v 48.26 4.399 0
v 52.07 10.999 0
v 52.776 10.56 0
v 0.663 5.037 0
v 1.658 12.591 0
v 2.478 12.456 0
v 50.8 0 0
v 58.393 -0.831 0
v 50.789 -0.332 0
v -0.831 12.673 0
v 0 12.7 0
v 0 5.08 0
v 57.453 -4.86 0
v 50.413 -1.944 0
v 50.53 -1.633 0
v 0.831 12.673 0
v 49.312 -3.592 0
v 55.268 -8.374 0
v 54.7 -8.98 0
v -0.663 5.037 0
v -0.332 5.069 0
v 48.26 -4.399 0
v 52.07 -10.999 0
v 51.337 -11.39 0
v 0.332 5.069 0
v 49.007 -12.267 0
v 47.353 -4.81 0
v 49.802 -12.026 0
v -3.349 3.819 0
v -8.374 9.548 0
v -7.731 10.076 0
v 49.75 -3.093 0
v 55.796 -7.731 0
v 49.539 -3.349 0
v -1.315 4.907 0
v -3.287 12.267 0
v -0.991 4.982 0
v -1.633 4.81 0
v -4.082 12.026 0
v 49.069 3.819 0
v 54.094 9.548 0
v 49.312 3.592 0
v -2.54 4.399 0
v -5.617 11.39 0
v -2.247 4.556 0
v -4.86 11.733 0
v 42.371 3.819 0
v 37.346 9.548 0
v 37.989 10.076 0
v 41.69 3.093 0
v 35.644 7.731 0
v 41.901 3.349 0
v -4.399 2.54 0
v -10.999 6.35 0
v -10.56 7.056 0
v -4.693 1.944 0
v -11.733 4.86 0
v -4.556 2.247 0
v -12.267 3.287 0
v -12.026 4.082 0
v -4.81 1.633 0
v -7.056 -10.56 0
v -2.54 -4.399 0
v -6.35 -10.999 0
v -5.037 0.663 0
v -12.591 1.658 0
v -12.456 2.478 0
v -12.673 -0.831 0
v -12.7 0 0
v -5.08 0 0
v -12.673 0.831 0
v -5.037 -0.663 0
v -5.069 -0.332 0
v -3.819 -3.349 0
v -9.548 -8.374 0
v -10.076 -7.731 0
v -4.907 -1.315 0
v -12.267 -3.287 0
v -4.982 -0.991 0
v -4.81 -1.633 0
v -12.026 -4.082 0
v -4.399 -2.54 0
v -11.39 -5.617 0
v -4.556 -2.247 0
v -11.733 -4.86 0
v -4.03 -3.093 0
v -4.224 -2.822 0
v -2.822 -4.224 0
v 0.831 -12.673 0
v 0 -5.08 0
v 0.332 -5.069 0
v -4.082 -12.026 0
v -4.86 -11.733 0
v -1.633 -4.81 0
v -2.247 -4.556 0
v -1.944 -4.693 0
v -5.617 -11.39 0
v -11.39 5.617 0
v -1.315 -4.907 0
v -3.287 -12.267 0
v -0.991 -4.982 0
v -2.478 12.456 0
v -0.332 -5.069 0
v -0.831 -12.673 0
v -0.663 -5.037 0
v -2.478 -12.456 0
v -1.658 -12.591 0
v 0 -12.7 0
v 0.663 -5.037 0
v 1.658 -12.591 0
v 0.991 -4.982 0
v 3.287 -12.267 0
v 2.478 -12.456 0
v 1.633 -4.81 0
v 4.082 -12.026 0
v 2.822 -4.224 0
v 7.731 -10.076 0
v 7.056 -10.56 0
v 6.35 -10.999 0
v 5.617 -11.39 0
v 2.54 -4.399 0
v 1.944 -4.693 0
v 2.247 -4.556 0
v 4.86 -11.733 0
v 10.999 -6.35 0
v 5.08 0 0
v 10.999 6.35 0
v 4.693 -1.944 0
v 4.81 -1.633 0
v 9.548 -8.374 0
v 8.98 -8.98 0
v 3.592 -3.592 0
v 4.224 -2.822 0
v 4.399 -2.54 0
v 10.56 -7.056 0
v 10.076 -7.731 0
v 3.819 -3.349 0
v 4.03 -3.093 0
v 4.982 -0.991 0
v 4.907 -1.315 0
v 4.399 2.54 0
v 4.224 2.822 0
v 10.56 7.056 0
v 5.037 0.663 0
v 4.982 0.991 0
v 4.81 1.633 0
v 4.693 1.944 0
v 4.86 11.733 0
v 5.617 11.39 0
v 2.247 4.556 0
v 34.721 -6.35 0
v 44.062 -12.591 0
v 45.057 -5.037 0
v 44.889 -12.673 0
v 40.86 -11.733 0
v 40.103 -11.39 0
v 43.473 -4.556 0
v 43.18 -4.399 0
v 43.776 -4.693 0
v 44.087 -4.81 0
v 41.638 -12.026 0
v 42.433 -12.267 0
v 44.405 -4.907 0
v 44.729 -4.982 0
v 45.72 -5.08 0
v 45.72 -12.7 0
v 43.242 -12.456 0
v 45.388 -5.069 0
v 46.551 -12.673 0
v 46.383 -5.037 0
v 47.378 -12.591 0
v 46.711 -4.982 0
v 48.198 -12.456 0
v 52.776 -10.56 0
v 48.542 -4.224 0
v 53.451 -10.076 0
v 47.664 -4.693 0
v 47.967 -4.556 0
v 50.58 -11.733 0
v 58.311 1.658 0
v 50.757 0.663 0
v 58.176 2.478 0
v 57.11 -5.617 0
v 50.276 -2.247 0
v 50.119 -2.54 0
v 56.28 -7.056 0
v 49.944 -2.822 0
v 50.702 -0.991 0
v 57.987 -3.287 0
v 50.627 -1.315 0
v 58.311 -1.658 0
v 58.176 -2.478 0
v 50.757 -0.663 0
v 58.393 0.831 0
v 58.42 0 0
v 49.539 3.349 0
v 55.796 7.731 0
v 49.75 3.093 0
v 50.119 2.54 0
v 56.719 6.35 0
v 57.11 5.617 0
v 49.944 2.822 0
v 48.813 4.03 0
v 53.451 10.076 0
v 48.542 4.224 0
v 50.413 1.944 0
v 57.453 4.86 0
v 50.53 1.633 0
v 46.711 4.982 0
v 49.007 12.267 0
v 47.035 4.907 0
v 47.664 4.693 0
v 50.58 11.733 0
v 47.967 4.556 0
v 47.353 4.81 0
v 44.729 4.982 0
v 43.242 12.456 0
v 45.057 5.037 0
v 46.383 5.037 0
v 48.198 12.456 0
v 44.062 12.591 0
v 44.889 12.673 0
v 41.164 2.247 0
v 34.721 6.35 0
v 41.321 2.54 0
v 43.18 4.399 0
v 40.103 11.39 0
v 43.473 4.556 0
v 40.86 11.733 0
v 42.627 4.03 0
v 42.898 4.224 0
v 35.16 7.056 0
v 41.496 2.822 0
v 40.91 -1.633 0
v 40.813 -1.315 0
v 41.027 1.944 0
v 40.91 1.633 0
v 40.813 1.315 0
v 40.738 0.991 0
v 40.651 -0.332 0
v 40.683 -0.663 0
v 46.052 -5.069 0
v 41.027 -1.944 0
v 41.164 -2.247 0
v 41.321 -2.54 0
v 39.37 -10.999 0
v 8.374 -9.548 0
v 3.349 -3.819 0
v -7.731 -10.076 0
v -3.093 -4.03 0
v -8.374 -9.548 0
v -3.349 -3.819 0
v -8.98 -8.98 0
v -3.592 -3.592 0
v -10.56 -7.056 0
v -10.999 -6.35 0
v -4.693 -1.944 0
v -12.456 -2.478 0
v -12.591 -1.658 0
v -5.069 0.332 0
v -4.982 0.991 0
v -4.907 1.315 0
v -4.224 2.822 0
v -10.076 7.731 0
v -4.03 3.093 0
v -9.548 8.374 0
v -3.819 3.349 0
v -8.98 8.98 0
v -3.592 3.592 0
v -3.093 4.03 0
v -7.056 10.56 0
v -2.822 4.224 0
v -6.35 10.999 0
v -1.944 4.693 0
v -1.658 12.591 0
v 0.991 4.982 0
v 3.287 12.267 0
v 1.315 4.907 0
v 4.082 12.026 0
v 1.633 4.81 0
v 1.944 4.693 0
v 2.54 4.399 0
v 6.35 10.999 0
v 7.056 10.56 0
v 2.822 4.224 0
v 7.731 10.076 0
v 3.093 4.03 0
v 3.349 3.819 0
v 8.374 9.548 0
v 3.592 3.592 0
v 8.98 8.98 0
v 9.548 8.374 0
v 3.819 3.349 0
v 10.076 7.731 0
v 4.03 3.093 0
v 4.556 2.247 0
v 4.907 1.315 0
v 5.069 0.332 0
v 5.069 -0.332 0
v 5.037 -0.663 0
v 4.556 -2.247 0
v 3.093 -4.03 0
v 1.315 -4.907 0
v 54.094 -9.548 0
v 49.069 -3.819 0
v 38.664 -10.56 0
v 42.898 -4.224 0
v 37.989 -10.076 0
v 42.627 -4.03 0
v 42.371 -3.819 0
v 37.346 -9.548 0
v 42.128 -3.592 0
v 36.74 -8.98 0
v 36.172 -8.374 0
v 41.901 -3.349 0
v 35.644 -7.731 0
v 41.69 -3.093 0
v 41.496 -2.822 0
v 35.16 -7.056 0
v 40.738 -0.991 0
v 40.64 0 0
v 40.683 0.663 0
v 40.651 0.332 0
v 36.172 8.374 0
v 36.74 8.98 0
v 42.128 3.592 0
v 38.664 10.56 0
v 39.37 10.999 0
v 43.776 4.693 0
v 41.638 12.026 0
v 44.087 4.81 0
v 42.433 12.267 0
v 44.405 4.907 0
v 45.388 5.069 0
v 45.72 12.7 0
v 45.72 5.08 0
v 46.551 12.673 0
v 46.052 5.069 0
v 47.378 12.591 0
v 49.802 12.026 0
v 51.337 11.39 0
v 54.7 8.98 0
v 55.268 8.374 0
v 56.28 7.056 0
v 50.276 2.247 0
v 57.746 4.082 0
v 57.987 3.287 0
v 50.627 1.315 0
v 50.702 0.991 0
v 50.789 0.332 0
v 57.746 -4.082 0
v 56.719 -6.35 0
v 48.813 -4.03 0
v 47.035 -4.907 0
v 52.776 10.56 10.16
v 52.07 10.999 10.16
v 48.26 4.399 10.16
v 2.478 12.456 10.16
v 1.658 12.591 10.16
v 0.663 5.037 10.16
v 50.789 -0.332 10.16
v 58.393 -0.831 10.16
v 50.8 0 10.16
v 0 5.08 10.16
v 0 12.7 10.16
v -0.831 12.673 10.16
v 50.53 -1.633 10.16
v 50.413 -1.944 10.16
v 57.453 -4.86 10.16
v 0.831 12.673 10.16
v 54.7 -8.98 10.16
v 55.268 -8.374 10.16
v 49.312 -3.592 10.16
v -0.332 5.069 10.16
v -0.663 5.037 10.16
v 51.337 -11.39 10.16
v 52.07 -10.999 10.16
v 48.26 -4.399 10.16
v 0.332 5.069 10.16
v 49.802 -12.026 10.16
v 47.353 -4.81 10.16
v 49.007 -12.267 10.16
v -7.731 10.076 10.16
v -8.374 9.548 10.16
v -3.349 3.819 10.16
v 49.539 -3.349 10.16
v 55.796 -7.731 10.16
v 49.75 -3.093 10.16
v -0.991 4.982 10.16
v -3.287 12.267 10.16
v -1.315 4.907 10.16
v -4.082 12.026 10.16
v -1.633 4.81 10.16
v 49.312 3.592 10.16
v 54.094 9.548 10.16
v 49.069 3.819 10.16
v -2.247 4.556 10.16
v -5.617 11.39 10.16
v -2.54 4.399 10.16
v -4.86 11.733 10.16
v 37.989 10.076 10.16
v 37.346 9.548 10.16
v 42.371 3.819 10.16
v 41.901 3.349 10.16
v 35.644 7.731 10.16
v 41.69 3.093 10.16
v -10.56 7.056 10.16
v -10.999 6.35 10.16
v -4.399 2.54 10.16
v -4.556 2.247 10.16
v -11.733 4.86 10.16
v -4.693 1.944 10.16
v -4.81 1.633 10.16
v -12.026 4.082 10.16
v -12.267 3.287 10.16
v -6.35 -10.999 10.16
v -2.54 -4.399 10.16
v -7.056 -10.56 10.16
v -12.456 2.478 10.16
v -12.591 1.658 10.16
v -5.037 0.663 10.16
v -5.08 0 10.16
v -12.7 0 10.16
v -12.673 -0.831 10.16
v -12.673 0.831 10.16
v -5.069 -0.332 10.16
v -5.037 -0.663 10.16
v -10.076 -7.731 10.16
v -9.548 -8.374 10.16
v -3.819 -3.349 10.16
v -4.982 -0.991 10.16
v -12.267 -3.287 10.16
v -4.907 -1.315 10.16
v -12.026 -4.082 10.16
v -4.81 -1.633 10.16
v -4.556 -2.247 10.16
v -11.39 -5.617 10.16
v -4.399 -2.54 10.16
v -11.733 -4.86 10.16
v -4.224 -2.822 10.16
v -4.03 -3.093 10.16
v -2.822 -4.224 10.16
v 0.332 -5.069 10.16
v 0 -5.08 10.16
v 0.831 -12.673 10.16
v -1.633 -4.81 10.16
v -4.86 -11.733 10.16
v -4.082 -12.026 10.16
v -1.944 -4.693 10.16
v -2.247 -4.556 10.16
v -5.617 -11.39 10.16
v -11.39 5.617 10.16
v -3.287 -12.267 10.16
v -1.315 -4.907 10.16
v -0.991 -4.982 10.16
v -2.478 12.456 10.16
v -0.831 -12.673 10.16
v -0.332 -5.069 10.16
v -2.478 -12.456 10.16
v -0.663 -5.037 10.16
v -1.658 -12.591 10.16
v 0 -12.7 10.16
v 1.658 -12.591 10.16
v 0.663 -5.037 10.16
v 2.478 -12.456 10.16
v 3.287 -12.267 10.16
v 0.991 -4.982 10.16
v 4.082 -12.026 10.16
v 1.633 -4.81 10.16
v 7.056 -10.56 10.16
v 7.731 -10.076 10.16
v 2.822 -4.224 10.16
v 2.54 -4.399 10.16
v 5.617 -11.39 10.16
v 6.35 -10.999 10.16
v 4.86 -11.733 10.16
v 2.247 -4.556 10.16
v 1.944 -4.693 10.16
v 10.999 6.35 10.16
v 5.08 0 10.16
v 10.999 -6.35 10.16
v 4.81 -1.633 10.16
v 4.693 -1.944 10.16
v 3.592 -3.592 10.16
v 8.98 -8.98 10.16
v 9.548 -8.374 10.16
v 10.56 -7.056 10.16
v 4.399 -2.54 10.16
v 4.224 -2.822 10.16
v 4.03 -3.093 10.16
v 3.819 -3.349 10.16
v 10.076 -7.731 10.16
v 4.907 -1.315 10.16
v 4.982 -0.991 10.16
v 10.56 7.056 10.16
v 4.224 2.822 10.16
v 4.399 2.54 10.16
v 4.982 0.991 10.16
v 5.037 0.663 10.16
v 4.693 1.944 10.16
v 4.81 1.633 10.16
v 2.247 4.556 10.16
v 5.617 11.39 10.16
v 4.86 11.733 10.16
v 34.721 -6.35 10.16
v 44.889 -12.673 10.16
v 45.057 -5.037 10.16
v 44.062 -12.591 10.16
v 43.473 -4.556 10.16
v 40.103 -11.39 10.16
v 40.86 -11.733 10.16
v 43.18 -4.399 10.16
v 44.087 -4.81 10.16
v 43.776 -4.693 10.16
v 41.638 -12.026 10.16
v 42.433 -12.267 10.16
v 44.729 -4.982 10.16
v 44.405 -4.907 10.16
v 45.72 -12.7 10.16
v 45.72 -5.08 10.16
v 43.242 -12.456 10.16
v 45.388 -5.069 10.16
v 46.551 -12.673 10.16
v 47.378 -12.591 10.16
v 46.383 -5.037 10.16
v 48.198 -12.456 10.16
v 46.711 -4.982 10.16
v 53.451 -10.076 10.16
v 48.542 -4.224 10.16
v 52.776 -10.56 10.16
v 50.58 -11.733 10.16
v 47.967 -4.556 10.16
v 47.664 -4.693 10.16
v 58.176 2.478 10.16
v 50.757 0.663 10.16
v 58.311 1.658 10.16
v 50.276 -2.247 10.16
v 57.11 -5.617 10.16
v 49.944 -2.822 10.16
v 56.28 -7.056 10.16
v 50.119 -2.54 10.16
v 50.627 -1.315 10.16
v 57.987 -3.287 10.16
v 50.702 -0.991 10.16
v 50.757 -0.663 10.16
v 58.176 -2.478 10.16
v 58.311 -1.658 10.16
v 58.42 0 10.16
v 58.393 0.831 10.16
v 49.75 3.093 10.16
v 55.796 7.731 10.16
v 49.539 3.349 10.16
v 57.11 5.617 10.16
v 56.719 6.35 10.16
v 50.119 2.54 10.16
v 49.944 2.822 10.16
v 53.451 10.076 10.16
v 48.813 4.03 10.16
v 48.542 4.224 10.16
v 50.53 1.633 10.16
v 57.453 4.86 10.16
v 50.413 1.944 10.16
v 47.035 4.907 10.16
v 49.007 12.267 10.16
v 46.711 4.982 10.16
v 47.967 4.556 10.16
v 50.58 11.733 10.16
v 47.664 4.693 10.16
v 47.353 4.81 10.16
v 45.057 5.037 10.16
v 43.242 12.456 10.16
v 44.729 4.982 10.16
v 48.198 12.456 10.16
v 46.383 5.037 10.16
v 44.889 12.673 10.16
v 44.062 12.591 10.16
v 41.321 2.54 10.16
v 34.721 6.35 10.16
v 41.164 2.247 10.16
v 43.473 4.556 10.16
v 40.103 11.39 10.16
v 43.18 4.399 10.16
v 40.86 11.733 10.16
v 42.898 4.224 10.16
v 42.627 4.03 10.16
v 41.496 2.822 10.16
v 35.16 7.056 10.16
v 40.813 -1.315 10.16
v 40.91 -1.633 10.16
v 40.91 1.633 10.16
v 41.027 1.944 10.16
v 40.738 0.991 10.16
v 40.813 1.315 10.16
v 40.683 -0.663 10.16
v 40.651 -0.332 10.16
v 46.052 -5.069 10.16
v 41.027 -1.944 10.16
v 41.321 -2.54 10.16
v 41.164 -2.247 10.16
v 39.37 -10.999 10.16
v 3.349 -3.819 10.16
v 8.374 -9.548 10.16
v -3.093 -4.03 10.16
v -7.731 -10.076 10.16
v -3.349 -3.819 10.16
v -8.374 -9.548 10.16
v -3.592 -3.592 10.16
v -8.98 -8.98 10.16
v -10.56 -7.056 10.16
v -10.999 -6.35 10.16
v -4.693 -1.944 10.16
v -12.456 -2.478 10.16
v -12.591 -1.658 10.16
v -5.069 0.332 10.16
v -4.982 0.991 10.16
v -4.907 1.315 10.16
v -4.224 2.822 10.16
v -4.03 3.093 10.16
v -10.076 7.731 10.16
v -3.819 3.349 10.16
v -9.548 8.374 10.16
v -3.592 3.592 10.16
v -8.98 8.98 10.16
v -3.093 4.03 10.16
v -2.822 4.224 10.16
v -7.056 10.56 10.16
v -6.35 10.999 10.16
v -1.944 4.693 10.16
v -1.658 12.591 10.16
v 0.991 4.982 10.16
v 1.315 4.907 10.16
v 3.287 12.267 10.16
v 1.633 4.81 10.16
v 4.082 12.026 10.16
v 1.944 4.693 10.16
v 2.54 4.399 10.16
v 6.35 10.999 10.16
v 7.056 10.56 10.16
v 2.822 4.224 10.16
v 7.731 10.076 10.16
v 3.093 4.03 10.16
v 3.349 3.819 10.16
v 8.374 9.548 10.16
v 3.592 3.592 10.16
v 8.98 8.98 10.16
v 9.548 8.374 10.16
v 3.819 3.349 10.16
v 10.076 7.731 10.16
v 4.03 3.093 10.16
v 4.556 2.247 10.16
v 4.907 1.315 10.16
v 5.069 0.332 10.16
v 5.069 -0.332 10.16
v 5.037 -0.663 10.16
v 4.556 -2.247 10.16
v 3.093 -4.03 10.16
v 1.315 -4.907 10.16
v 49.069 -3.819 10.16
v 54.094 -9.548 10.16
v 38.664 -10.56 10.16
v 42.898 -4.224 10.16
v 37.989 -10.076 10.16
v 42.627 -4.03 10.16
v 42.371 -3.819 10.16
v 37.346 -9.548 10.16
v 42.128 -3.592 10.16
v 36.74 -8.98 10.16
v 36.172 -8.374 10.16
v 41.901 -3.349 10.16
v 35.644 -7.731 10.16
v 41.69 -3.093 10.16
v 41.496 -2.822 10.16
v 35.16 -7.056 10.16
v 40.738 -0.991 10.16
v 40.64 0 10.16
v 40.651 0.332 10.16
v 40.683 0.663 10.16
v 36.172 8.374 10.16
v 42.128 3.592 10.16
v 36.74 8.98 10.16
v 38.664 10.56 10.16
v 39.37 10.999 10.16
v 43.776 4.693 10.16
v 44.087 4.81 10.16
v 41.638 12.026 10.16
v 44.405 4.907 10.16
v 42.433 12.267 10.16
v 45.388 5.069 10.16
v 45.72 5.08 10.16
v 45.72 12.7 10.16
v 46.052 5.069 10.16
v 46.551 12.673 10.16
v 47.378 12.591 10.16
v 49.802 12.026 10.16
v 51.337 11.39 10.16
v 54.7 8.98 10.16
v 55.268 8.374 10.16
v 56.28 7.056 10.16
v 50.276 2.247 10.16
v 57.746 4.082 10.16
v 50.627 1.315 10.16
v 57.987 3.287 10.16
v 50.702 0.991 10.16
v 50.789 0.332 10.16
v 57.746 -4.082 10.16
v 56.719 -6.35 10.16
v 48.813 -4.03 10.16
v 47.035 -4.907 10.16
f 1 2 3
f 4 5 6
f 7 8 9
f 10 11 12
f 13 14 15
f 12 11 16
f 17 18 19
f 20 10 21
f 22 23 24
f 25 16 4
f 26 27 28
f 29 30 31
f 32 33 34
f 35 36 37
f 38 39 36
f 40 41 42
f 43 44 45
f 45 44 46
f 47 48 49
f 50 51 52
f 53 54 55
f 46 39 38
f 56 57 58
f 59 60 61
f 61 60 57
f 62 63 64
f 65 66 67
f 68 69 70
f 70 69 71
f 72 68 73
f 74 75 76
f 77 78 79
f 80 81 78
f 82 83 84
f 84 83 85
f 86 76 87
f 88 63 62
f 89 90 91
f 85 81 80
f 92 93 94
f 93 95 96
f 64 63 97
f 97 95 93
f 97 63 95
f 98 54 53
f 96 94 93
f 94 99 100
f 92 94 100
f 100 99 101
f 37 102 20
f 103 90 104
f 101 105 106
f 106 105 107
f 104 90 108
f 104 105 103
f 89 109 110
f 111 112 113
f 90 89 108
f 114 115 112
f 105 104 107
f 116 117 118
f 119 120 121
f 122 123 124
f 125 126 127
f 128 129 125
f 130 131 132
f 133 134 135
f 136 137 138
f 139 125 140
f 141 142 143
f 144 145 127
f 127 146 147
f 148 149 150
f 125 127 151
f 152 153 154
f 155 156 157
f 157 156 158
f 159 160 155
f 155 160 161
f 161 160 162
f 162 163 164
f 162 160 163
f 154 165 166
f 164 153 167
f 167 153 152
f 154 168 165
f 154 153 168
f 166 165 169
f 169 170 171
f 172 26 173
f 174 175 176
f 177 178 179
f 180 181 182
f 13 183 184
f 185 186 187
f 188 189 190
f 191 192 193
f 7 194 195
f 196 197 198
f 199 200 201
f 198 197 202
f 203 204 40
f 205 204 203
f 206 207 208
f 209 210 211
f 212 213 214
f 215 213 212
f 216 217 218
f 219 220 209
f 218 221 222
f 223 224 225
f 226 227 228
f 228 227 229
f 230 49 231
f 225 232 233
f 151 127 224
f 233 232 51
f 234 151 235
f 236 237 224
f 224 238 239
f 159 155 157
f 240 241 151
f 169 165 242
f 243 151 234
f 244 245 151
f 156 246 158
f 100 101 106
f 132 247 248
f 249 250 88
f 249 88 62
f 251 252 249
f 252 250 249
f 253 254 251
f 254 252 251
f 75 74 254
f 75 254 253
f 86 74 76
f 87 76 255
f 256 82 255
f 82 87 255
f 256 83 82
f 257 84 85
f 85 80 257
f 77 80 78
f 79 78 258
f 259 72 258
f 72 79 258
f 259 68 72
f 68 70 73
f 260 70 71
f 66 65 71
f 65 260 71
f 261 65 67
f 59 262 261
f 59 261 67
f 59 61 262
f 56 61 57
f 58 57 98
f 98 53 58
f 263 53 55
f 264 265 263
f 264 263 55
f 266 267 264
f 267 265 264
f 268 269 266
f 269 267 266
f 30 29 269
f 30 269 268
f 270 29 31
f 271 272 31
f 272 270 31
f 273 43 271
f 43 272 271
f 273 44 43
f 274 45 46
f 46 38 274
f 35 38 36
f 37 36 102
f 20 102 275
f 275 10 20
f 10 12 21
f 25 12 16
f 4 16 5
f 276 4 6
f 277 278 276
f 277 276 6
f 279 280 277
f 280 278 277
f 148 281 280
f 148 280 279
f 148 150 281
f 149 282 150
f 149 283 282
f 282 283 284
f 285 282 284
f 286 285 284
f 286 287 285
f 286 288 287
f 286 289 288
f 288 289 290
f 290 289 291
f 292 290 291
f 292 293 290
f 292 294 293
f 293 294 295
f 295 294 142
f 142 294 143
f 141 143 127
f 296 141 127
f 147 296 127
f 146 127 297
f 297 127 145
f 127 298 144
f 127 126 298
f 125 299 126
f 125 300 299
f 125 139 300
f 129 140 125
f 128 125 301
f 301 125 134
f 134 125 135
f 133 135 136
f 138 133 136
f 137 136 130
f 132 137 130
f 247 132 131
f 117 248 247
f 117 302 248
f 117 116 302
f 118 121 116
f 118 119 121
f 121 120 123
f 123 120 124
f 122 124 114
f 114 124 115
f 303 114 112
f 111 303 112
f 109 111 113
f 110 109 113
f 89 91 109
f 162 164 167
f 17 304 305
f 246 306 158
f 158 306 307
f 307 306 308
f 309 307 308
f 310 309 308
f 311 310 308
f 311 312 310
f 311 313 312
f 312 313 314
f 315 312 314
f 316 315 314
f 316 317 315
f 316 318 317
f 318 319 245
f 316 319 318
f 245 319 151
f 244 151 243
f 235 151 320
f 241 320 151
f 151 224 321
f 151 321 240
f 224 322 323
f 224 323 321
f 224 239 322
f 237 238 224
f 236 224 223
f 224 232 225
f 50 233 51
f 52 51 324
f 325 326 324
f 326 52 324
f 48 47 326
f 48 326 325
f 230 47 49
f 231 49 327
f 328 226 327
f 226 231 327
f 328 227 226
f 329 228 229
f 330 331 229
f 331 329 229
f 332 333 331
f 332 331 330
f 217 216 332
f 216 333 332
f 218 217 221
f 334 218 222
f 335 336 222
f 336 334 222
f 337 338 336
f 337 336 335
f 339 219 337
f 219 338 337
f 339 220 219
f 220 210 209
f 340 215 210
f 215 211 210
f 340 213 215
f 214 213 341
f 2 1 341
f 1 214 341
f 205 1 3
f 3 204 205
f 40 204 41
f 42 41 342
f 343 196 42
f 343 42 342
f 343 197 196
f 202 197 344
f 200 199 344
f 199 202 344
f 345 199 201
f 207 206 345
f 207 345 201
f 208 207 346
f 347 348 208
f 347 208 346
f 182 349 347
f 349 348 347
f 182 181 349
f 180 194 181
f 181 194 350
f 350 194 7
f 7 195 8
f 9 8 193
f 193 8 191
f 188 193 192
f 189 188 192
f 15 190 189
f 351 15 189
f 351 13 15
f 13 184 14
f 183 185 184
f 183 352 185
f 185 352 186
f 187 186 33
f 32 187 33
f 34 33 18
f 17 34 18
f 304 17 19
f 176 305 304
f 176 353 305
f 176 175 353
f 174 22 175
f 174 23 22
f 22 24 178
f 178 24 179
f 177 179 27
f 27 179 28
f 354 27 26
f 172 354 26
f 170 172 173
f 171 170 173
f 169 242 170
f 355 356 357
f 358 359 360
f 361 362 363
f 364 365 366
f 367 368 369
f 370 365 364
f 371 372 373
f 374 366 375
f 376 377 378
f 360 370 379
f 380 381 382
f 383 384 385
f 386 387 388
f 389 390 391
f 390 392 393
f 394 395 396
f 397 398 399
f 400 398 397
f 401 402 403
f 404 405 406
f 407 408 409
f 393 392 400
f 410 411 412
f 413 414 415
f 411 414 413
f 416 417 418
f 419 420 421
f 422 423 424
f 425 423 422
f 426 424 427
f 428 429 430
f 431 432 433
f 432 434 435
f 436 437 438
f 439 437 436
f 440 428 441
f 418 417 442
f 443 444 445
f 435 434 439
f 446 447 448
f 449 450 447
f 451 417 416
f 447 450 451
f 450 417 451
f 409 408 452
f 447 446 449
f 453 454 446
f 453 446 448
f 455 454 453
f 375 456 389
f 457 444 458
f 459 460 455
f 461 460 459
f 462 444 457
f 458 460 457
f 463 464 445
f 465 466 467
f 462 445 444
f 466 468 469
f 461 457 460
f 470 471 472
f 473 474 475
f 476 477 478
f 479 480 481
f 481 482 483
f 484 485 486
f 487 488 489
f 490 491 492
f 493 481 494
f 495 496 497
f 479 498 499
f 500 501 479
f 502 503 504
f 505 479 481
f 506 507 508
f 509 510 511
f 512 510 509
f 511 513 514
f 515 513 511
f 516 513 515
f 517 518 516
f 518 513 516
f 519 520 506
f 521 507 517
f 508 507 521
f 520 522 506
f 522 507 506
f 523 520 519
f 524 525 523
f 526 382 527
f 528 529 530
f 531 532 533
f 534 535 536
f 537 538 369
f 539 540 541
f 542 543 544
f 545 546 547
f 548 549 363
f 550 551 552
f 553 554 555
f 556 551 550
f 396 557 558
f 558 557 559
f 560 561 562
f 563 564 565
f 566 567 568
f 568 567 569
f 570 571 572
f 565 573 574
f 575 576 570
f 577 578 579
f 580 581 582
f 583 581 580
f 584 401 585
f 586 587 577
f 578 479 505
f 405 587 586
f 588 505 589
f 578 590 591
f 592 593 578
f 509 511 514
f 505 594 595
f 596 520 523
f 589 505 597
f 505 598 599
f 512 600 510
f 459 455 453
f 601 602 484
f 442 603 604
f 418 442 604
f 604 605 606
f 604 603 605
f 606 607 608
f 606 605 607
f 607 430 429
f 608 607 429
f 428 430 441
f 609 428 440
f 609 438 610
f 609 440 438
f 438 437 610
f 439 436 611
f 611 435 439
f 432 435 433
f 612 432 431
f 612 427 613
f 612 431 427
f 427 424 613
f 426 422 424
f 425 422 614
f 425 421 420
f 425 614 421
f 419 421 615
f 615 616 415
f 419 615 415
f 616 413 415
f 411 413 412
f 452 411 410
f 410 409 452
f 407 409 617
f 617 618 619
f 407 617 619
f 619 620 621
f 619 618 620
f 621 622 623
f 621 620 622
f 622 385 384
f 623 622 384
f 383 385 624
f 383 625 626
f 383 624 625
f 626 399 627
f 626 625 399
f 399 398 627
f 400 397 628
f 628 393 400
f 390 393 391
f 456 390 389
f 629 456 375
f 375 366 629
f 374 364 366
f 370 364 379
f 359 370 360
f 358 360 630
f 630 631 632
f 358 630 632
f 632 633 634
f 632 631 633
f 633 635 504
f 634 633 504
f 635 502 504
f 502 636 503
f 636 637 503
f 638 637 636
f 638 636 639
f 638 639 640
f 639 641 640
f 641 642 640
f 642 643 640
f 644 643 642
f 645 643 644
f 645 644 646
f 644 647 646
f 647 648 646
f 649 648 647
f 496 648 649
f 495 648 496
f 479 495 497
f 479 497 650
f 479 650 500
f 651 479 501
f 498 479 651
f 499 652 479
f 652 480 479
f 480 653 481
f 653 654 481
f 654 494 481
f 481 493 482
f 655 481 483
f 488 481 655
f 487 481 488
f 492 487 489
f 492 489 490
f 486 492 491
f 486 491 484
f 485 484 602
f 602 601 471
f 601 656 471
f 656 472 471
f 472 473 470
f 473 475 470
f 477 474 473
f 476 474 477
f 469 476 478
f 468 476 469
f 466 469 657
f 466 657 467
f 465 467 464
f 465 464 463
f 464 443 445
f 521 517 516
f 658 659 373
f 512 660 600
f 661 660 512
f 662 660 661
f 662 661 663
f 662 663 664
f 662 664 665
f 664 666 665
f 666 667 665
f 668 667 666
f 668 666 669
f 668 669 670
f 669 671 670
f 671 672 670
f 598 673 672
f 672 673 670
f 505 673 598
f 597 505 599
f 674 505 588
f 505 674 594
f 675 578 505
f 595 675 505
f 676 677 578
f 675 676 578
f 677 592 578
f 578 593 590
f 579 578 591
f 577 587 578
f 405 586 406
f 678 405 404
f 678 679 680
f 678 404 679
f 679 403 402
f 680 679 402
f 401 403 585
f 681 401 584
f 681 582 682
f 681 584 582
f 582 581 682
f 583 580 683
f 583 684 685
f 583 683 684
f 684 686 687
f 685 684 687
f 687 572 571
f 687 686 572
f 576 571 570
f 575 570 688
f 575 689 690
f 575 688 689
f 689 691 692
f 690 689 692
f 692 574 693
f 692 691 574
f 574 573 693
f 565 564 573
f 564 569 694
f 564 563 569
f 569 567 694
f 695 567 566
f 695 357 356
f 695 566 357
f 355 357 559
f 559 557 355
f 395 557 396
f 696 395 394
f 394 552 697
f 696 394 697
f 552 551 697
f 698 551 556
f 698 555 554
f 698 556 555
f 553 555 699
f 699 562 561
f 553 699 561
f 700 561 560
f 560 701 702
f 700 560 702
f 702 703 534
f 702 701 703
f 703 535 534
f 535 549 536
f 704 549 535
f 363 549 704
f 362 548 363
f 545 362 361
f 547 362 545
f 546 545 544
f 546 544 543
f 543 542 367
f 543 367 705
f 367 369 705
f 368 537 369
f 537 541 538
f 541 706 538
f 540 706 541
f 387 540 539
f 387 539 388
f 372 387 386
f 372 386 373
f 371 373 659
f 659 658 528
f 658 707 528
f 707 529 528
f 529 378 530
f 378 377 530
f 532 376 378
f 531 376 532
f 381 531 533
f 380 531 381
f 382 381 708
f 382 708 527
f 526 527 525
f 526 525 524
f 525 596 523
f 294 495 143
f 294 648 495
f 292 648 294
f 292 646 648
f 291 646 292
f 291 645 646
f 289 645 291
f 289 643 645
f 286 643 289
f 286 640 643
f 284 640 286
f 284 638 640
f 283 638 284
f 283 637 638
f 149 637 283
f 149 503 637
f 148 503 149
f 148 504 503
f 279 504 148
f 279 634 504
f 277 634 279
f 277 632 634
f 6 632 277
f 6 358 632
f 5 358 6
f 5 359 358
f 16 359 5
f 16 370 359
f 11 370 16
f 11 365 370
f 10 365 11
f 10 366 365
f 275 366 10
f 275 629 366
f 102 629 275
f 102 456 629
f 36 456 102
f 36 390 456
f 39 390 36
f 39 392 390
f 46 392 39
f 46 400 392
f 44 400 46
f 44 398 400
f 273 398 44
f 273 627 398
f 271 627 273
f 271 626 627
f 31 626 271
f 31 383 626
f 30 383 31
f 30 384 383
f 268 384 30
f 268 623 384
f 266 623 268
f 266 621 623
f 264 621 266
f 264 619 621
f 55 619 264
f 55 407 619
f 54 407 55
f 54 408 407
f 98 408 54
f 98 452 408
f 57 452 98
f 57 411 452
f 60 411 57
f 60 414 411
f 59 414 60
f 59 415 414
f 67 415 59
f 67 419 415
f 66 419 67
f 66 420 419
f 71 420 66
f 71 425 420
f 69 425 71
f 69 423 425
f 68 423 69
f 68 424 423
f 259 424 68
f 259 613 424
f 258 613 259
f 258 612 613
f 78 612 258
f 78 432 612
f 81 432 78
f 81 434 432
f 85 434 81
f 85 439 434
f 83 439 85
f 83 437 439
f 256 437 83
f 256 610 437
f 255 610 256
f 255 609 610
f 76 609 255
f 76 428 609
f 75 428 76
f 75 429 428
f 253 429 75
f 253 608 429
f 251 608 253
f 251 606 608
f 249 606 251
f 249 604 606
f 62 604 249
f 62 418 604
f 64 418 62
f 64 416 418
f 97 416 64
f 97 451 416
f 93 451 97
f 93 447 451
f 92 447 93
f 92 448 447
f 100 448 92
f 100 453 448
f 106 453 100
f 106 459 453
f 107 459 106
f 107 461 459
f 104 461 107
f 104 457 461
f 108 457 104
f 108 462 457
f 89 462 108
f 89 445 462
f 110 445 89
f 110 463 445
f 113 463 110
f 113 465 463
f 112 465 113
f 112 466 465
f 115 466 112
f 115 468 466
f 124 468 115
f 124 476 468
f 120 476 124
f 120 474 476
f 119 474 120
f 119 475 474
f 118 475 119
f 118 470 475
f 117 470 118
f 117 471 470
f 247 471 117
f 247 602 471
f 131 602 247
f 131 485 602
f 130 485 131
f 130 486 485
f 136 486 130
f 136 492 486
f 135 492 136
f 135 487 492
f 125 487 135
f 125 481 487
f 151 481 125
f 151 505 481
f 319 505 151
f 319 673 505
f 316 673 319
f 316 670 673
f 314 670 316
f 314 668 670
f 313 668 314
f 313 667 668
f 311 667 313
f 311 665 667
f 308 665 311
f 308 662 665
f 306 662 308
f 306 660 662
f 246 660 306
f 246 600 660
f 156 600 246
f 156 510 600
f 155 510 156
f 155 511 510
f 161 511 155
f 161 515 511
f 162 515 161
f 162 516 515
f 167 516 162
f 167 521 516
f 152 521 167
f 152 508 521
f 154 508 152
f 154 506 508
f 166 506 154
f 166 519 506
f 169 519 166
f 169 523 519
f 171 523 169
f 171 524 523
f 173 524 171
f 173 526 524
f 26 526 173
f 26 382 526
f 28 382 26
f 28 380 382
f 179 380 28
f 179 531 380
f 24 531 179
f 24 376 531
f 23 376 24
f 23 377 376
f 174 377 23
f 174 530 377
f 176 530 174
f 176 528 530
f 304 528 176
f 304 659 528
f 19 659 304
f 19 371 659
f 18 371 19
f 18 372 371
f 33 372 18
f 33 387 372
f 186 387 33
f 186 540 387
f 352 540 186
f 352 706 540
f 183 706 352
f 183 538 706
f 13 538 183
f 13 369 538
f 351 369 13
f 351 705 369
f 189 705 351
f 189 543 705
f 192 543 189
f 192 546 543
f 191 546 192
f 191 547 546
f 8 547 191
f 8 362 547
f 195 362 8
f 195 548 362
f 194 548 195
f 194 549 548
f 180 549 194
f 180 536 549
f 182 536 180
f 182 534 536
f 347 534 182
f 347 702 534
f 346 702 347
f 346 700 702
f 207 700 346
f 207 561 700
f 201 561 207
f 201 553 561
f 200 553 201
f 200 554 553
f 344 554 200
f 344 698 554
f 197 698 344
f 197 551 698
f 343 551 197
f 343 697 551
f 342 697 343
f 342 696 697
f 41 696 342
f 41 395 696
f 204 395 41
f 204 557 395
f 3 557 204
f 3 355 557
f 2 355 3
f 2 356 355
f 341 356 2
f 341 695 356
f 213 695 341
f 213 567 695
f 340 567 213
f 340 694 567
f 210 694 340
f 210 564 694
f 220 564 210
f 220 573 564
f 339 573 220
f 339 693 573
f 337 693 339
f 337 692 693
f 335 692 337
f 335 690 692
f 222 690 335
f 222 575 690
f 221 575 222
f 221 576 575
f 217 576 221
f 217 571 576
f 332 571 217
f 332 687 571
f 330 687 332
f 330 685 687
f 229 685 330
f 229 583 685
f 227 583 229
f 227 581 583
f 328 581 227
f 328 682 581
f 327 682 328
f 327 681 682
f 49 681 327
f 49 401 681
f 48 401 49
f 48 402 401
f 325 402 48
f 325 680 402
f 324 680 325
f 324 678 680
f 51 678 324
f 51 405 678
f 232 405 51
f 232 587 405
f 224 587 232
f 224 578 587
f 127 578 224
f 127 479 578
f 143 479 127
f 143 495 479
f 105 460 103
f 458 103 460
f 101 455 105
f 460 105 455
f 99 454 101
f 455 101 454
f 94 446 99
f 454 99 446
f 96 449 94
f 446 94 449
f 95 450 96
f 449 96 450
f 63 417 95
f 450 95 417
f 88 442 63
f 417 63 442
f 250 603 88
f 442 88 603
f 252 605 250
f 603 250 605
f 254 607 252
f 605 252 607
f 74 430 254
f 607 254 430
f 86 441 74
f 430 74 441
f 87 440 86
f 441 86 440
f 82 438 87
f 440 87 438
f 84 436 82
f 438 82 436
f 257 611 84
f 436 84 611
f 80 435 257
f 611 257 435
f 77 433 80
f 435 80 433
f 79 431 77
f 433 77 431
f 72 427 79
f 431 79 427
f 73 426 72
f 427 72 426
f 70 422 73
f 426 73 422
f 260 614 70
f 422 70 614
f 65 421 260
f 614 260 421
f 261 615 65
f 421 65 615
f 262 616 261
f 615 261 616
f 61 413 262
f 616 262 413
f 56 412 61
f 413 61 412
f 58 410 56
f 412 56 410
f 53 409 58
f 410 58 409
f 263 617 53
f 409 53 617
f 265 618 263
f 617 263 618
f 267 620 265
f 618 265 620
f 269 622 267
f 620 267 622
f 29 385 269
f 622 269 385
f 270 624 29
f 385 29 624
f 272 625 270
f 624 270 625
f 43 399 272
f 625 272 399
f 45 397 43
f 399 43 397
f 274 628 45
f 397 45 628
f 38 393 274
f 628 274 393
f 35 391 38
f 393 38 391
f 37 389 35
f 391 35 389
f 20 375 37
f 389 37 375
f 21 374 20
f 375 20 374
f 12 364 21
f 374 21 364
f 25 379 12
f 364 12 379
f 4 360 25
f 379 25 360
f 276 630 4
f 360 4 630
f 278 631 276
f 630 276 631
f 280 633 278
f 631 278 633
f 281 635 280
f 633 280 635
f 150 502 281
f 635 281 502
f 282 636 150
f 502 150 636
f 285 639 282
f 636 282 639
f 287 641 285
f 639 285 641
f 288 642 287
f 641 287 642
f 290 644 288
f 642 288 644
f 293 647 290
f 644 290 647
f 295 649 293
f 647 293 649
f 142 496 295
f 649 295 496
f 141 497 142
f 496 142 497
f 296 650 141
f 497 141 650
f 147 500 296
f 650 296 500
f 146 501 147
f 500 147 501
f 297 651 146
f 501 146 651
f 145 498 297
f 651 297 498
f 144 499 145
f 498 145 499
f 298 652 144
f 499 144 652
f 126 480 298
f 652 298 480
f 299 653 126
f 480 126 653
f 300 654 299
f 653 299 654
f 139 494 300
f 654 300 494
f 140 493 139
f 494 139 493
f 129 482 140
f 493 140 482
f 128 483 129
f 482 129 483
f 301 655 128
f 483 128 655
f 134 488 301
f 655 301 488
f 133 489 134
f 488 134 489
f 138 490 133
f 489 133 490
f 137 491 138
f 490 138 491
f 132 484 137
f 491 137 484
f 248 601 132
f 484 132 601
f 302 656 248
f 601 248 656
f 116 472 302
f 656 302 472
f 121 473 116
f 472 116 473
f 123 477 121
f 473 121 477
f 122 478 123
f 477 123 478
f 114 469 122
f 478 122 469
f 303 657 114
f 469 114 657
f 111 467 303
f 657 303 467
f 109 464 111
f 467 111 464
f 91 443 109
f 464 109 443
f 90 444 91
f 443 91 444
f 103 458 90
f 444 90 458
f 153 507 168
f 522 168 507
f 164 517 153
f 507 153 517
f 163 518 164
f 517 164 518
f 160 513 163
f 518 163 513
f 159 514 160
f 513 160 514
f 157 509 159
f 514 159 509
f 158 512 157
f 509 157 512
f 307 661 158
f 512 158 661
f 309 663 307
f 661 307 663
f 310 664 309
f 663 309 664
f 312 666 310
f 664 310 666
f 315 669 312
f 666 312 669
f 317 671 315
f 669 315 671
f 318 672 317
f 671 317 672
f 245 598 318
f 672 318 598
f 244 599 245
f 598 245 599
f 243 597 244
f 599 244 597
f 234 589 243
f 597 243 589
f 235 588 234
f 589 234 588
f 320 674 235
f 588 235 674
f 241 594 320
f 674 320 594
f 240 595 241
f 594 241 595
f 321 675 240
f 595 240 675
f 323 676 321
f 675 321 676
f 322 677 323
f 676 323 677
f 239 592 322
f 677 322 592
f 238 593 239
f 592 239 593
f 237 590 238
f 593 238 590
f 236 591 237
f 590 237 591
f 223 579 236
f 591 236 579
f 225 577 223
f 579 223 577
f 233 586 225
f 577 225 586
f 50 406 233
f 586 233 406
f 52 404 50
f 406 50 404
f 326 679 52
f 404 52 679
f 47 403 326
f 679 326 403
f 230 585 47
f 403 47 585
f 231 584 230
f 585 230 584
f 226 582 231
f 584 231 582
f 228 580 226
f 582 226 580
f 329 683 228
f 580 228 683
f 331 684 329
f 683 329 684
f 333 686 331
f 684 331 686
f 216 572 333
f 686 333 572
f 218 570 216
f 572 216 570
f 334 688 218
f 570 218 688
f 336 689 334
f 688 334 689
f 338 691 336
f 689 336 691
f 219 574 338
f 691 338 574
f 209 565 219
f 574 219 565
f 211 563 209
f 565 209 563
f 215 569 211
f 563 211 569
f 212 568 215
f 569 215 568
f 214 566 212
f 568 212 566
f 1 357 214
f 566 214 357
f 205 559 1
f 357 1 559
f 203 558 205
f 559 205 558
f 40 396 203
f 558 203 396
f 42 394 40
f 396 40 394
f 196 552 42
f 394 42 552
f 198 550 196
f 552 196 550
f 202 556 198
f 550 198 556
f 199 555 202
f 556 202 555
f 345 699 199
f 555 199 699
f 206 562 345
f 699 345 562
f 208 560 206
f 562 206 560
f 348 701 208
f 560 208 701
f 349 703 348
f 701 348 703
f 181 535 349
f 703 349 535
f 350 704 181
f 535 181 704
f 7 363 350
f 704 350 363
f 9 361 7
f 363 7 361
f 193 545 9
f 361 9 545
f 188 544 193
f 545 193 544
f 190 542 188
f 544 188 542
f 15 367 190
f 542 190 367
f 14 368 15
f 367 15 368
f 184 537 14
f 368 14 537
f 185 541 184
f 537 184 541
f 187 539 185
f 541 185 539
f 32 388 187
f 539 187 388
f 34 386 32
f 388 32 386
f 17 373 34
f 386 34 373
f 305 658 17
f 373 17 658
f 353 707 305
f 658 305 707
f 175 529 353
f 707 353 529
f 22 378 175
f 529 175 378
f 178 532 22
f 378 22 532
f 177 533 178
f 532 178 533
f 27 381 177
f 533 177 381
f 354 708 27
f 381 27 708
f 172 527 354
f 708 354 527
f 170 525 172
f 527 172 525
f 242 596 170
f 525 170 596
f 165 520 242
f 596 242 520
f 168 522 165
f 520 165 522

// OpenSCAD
ViewScale = [0.0254, 0.0254, 0.0254];

scale(ViewScale)
{
    linear_extrude(400) {
    difference() {
    circle(500, $fn=96, center=true);
    circle(200, $fn=96, center=true);
    }
    translate([1800, 0, 0])
    difference() {
    circle(500, $fn=96, center=true);
    circle(200, $fn=96, center=true);
    }
    #translate([900, 0, 0])
    square([1000, 500], center=true);
    }
}
